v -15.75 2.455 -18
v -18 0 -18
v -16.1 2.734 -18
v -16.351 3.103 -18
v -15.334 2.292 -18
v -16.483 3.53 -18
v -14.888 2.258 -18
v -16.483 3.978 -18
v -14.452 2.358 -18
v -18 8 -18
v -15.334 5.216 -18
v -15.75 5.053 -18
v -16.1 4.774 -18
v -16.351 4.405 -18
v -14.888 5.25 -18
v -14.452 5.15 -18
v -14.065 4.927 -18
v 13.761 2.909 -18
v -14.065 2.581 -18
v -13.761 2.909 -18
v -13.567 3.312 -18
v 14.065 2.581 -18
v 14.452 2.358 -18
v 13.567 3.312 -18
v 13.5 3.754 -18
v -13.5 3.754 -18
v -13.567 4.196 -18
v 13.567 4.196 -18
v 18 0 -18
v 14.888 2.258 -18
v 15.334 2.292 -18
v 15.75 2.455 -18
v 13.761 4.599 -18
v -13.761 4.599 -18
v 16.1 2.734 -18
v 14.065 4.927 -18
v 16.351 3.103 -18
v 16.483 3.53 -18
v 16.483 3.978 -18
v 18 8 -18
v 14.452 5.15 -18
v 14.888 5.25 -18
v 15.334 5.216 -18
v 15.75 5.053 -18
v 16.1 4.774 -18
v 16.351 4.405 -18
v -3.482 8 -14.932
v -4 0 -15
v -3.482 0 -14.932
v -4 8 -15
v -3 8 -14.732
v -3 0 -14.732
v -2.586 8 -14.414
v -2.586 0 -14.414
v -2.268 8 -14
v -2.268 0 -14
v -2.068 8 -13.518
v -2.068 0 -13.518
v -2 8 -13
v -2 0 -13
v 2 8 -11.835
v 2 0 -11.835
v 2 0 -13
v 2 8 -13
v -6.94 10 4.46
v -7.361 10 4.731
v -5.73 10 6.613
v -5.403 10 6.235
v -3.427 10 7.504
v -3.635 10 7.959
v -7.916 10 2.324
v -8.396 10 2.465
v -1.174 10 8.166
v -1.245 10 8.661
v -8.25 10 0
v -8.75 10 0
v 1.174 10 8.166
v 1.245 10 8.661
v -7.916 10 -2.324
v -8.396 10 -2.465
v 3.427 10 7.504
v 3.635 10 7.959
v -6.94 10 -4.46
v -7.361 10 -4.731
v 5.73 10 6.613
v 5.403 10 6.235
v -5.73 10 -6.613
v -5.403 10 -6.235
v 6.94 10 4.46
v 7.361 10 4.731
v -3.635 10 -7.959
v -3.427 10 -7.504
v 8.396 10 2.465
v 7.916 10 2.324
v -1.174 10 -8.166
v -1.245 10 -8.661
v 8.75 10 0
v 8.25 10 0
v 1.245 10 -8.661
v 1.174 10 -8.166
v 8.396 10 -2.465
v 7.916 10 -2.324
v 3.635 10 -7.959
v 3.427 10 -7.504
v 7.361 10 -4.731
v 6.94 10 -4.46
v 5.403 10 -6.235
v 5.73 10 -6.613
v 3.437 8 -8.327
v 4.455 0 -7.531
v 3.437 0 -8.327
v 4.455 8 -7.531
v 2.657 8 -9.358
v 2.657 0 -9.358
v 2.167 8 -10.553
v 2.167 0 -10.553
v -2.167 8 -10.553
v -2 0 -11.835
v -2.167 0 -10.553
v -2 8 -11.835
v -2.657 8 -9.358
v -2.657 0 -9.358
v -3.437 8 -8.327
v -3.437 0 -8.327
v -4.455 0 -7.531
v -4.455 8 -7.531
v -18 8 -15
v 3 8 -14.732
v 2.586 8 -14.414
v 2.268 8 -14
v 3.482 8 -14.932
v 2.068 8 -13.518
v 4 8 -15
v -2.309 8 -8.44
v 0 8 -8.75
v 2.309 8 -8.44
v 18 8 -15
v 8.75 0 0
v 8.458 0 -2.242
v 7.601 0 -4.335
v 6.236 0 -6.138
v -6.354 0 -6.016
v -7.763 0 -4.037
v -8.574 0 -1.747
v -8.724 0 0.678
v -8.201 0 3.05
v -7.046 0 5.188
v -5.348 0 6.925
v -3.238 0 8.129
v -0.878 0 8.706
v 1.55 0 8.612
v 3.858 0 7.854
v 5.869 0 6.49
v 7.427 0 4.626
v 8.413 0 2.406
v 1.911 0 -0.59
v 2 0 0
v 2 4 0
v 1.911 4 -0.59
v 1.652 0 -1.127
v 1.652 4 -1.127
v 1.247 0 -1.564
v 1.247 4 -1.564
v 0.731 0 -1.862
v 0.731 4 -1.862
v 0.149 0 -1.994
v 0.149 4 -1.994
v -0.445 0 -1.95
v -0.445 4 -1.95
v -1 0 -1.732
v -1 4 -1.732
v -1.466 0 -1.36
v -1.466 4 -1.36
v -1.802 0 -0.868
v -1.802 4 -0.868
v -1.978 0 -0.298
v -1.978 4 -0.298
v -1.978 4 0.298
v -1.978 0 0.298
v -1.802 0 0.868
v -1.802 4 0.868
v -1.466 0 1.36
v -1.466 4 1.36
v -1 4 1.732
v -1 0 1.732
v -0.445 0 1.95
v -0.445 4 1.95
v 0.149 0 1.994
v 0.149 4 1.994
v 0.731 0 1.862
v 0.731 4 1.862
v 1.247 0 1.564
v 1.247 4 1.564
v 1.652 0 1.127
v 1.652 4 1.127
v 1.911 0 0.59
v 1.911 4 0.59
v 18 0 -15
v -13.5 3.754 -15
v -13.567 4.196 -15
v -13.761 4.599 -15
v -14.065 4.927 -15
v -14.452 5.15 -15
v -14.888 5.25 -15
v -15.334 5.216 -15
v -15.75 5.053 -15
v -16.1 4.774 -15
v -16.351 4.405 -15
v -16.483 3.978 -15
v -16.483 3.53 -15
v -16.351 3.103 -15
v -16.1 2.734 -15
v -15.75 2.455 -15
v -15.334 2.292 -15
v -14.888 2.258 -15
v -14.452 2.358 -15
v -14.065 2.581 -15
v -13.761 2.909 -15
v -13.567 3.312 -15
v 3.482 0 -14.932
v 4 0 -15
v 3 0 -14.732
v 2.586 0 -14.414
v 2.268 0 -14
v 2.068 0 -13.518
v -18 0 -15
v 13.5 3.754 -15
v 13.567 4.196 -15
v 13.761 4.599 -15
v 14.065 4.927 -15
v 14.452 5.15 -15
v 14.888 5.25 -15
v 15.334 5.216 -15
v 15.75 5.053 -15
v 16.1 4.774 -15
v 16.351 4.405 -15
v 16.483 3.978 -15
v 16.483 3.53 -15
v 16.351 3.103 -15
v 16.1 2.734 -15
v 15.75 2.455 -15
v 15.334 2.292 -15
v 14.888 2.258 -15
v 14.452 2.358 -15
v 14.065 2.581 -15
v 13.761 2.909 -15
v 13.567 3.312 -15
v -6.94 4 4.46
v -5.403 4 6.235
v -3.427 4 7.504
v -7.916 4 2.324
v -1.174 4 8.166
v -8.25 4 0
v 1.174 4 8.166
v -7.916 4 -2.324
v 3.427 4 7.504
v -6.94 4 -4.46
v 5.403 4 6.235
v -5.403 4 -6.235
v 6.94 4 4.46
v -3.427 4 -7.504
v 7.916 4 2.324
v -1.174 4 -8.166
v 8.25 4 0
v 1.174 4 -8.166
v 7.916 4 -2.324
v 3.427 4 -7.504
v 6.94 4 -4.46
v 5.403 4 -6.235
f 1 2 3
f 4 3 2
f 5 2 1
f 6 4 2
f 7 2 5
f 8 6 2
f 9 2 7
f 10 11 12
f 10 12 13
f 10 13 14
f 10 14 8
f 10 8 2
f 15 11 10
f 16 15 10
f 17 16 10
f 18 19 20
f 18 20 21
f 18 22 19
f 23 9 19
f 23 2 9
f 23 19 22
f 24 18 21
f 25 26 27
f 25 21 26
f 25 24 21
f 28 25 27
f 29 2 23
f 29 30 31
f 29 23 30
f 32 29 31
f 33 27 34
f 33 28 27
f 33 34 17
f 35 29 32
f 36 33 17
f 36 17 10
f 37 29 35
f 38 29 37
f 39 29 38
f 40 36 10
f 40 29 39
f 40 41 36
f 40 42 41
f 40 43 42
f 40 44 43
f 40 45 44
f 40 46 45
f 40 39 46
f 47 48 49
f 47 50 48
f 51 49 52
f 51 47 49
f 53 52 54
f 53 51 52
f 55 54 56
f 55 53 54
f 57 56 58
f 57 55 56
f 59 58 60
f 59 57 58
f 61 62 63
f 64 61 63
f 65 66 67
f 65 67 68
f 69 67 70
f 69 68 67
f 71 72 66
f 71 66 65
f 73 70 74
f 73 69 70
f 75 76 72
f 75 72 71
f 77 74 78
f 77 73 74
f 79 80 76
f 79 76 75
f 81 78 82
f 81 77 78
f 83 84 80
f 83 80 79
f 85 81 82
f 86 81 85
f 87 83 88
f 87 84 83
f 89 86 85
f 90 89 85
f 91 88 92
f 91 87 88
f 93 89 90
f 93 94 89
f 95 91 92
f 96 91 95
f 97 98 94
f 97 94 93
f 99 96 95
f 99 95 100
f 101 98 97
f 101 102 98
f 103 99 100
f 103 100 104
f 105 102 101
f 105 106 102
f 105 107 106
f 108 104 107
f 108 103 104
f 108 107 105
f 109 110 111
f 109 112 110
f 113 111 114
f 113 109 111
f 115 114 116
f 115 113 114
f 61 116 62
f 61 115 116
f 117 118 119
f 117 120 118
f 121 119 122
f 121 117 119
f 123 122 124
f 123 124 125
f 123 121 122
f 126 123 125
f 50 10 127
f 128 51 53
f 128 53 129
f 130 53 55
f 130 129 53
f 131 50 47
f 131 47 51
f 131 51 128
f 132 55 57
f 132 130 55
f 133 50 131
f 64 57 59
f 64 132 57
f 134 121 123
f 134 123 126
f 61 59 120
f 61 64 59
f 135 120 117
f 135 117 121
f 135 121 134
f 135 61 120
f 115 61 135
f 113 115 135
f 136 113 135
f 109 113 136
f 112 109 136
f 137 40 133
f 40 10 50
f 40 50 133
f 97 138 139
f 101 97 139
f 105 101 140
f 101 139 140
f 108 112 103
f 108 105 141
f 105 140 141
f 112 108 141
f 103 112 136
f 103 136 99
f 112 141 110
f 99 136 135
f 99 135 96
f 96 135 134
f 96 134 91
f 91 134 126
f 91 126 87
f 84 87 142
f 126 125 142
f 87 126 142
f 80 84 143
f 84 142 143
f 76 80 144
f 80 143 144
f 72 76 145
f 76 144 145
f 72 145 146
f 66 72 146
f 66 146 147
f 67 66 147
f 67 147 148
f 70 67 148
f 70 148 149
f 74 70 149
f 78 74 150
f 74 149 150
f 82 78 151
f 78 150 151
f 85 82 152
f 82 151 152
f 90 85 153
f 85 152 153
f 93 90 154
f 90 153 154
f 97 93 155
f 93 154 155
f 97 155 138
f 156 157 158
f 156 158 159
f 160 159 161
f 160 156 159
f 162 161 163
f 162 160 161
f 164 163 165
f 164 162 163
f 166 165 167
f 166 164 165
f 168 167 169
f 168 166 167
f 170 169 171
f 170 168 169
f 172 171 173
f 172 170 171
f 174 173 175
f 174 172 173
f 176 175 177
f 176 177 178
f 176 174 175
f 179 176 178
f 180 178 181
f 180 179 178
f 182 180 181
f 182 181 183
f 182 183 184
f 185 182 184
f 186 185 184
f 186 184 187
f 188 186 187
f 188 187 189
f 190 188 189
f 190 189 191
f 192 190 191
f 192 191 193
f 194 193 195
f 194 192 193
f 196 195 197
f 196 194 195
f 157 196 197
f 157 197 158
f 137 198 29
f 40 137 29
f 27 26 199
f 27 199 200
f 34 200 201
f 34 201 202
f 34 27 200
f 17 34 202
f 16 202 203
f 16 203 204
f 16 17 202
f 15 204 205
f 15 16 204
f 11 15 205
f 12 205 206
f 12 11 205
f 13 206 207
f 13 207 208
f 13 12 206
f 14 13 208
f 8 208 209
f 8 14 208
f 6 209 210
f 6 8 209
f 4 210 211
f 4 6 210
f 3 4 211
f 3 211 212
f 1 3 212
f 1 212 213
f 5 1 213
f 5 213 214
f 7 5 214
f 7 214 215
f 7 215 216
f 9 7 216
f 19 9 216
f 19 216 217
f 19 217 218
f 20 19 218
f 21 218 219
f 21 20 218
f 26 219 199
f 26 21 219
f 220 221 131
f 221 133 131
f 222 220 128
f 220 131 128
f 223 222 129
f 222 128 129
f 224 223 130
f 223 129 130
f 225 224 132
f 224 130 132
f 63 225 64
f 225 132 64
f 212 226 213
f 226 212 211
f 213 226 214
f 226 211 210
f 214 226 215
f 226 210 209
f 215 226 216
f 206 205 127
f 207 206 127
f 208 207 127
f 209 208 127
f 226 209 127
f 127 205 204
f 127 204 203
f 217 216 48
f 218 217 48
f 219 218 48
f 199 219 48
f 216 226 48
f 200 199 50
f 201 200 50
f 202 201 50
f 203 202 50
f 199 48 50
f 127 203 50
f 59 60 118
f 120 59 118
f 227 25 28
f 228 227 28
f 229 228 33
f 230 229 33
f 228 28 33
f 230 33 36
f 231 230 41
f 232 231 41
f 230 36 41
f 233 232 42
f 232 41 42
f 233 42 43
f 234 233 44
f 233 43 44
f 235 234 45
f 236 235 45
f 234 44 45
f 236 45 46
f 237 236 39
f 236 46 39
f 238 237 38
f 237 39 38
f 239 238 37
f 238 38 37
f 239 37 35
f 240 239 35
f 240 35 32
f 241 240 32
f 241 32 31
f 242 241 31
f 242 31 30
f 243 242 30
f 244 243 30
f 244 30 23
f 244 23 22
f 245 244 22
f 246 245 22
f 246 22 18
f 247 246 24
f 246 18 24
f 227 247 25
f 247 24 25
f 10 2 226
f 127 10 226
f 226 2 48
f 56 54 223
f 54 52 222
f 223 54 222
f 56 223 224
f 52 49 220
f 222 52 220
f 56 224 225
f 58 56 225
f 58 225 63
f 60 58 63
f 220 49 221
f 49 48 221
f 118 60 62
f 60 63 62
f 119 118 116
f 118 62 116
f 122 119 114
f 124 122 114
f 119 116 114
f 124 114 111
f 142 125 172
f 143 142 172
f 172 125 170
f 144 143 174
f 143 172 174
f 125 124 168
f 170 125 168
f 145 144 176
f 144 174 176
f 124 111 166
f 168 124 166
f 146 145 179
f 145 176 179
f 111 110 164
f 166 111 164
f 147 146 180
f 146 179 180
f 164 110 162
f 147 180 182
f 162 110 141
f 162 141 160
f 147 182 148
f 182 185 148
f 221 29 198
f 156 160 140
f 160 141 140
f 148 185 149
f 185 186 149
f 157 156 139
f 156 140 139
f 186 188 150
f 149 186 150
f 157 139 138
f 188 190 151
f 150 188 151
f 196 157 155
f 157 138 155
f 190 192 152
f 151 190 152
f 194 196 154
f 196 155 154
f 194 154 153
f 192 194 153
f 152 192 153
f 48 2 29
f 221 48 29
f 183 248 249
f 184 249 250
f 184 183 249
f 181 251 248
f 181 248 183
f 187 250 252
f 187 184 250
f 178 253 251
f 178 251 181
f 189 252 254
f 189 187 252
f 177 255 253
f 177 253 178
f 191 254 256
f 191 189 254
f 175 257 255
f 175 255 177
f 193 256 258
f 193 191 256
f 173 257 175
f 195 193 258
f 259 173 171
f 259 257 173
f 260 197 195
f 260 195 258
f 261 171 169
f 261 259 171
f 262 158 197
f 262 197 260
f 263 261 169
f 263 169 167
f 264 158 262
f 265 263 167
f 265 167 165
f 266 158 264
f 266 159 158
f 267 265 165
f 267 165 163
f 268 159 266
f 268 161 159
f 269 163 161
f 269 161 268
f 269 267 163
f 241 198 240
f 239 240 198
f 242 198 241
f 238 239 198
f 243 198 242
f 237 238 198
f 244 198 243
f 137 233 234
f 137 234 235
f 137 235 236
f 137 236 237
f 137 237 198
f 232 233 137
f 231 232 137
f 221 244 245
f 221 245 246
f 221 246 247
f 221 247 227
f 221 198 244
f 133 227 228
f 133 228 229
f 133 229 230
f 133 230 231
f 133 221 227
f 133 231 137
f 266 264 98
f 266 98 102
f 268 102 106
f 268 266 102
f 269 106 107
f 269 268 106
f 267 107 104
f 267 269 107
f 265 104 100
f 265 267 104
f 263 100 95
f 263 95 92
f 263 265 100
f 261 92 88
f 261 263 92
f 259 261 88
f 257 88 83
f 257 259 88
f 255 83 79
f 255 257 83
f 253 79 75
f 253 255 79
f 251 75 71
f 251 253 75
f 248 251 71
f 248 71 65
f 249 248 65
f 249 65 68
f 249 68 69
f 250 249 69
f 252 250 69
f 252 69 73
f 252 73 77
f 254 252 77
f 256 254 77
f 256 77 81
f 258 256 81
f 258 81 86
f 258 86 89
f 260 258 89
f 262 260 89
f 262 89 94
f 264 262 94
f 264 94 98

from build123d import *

# Parameters (mm, degrees)
SKETCH_1_R          = 8.75
SKETCH_1_R_2        = 8.25
EXTRUDE_2_DEPTH     = 10
SKETCH_2_R          = 8.25
SKETCH_2_R_2        = 2
EXTRUDE_3_DEPTH     = 4
EXTRUDE_4_DEPTH     = 8
SKETCH_5_W          = 3
SKETCH_5_H          = 8
EXTRUDE_5_DEPTH     = 3
SKETCH_6_W          = 3
SKETCH_6_H          = 8
EXTRUDE_6_DEPTH     = 3
SKETCH_7_R          = 1.5
CUT_EXTRUDE_1_DEPTH = 3
FILLET_1_R          = 5
FILLET_3_R          = 2
SKETCH_8_R          = 8.75
SKETCH_8_R_2        = 8.25
EXTRUDE_7_DEPTH     = 8
SKETCH_9_R          = 8.25
SKETCH_9_R_2        = 6
EXTRUDE_8_DEPTH     = 2
EXTRUDE_9_DEPTH     = 8
SKETCH_11_R         = 1.5
CUT_EXTRUDE_2_DEPTH = 8
CUT_EXTRUDE_3_DEPTH = 8
CUT_EXTRUDE_4_DEPTH = 8
SKETCH_14_R         = 8.75
SKETCH_14_R_2       = 8.25
EXTRUDE_10_DEPTH    = 8
EXTRUDE_11_DEPTH    = 8
SKETCH_16_R         = 1.5
CUT_EXTRUDE_5_DEPTH = 8
CUT_EXTRUDE_6_DEPTH = 10


with BuildPart() as part:
    # 草图1 → 凸台-拉伸2 (new body)
    with BuildSketch(Plane(origin=(0, 0, 0), x_dir=(1, 0, 0), z_dir=(0, 1, 0))):
        Circle(SKETCH_1_R)
        Circle(SKETCH_1_R_2, mode=Mode.SUBTRACT)
    extrude(amount=EXTRUDE_2_DEPTH)

    # 草图2 → 凸台-拉伸3 (add)
    with BuildSketch(Plane(origin=(0, 0, 0), x_dir=(1, 0, 0), z_dir=(0, 1, 0))):
        Circle(SKETCH_2_R)
        Circle(SKETCH_2_R_2, mode=Mode.SUBTRACT)
    extrude(amount=EXTRUDE_3_DEPTH)

    # 草图3 → 凸台-拉伸4 (add)
    with BuildSketch(Plane(origin=(0, 0, 0), x_dir=(1, 0, 0), z_dir=(0, 1, 0))):
        Polygon((-2, 8.518362519), (2, 8.518362519), (2, 15), (15, 15), (15, 18), (2, 18), (-2, 18), (-15, 18), (-15, 15), (-2, 15), align=None)
    extrude(amount=EXTRUDE_4_DEPTH)

    # 草图5 → 凸台-拉伸5 (add)
    with BuildSketch(Plane(origin=(15, 0, 0), x_dir=(0, 0, -1), z_dir=(1, 0, 0))):
        with Locations((16.5, 4)):
            Rectangle(SKETCH_5_W, SKETCH_5_H)
    extrude(amount=EXTRUDE_5_DEPTH)

    # 草图6 → 凸台-拉伸6 (add)
    with BuildSketch(Plane.ZY.offset(15)):
        with Locations((-16.5, 4)):
            Rectangle(SKETCH_6_W, SKETCH_6_H)
    extrude(amount=EXTRUDE_6_DEPTH)

    # 草图7 → 切除-拉伸1 (cut)
    with BuildSketch(Plane(origin=(0, 0, -18), x_dir=(-1, 0, 0), z_dir=(0, 0, -1))):
        with Locations((-15, 3.754021035)):
            Circle(SKETCH_7_R)
    cut_extrude_1 = extrude(amount=-CUT_EXTRUDE_1_DEPTH, mode=Mode.SUBTRACT)

    # 镜向1: 切除-拉伸1 across plane
    add(cut_extrude_1.mirror(Plane(origin=(0, 0, 0), x_dir=(0, 0, 1), z_dir=(1, 0, 0))), mode=Mode.SUBTRACT)

    # 圆角1
    fillet_1_edges = [part.edges().sort_by_distance(p)[0] for p in [
        (-2, 4, -8.518362519),
        (2, 4, -8.518362519),
    ]]
    fillet(fillet_1_edges, radius=FILLET_1_R)

    # 圆角3
    fillet_3_edges = [part.edges().sort_by_distance(p)[0] for p in [
        (-2, 4, -15),
        (2, 4, -15),
    ]]
    fillet(fillet_3_edges, radius=FILLET_3_R)


with BuildPart() as body_2:
    # 草图8 → 凸台-拉伸7 (new body)
    with BuildSketch(Plane(origin=(0, 0, 0), x_dir=(1, 0, 0), z_dir=(0, 1, 0))):
        with Locations((27.184954533, 0)):
            Circle(SKETCH_8_R)
        with Locations((27.184954533, 0)):
            Circle(SKETCH_8_R_2, mode=Mode.SUBTRACT)
    extrude(amount=EXTRUDE_7_DEPTH)

    # 草图9 → 凸台-拉伸8 (add)
    with BuildSketch(Plane.XZ):
        with Locations((27.184954533, 0)):
            Circle(SKETCH_9_R)
        with Locations((27.184954533, 0)):
            Circle(SKETCH_9_R_2, mode=Mode.SUBTRACT)
    extrude(amount=-EXTRUDE_8_DEPTH)

    # 草图10 → 凸台-拉伸9 (add)
    with BuildSketch(Plane(origin=(0, 0, 0), x_dir=(1, 0, 0), z_dir=(0, 1, 0))):
        Polygon((27.184954533, -18), (45.184954533, -18), (45.184954533, -14.663867829), (29.184954533, -14.663867829), (29.184954533, -8.518362519), (25.184954533, -8.518362519), (25.184954533, -14.663867829), (9.184954533, -14.663867829), (9.184954533, -18), align=None)
    extrude(amount=EXTRUDE_9_DEPTH)

    # 草图11 → 切除-拉伸2 (cut)
    with BuildSketch(Plane.XY.offset(18)):
        with Locations((12.184954533, 4)):
            Circle(SKETCH_11_R)
        with Locations((42.184954533, 4)):
            Circle(SKETCH_11_R)
    extrude(amount=-CUT_EXTRUDE_2_DEPTH, mode=Mode.SUBTRACT)

    # 草图12 → 切除-拉伸3 (cut)
    with BuildSketch(Plane.XY.offset(18)):
        with BuildLine():
            Line((10.684954533, 4), (10.684954533, 5))
            ThreePointArc((10.684954533, 5), (12.184954533, 6.5), (13.684954533, 5))
            Line((13.684954533, 5), (13.684954533, 4))
            Line((13.684954533, 4), (13.684954533, 3))
            ThreePointArc((13.684954533, 3), (12.184954533, 1.5), (10.684954533, 3))
            Line((10.684954533, 3), (10.684954533, 4))
        make_face()
    extrude(amount=-CUT_EXTRUDE_3_DEPTH, mode=Mode.SUBTRACT)

    # 草图13 → 切除-拉伸4 (cut)
    with BuildSketch(Plane.XY.offset(18)):
        with BuildLine():
            Line((40.684954533, 4), (40.684954533, 5))
            ThreePointArc((40.684954533, 5), (42.184954533, 6.5), (43.684954533, 5))
            Line((43.684954533, 5), (43.684954533, 4))
            Line((43.684954533, 4), (43.684954533, 3))
            ThreePointArc((43.684954533, 3), (42.184954533, 1.5), (40.684954533, 3))
            Line((40.684954533, 3), (40.684954533, 4))
        make_face()
    extrude(amount=-CUT_EXTRUDE_4_DEPTH, mode=Mode.SUBTRACT)


with BuildPart() as body_3:
    # 草图14 → 凸台-拉伸10 (new body)
    with BuildSketch(Plane(origin=(0, 0, 0), x_dir=(1, 0, 0), z_dir=(0, 1, 0))):
        with Locations((-35.091635024, 0)):
            Circle(SKETCH_14_R)
        with Locations((-35.091635024, 0)):
            Circle(SKETCH_14_R_2, mode=Mode.SUBTRACT)
    extrude(amount=EXTRUDE_10_DEPTH)

    # 草图15 → 凸台-拉伸11 (add)
    with BuildSketch(Plane(origin=(0, 0, 0), x_dir=(1, 0, 0), z_dir=(0, 1, 0))):
        Polygon((-37.091635024, -15), (-37.091635024, -8.518362519), (-33.091635024, -8.518362519), (-33.091635024, -15), (-17.091635024, -15), (-17.091635024, -18), (-53.091635024, -18), (-53.091635024, -15), align=None)
    extrude(amount=EXTRUDE_11_DEPTH)

    # 草图16 → 切除-拉伸5 (cut)
    with BuildSketch(Plane.XY.offset(18)):
        with Locations((-50.091635024, 4)):
            Circle(SKETCH_16_R)
        with Locations((-20.091635024, 4)):
            Circle(SKETCH_16_R)
    extrude(amount=-CUT_EXTRUDE_5_DEPTH, mode=Mode.SUBTRACT)


with BuildPart() as cut_extrude_6_tool:
    # 草图17 → 切除-拉伸6 (new body)
    with BuildSketch(Plane(origin=(0, 0, 0), x_dir=(1, 0, 0), z_dir=(0, 1, 0))):
        Polygon((-33.937696103, 15.405684546), (-2.722219819, -15.809791737), (14.647012306, -5.078130135), (14.647012306, 8.915639327), (41.967984005, 12.760711076), (60.531615551, -22.761160297), (-4.034255232, -33.891518563), (-68.183747723, -30.767123944), (-78.804576394, -10.443960936), (-56.287548242, 12.073067216), align=None)
    extrude(amount=CUT_EXTRUDE_6_DEPTH)


with BuildPart() as body_2_1:
    add(body_2.part)

    # 切除-拉伸6: cut by cut_extrude_6_tool
    add(cut_extrude_6_tool.part, mode=Mode.SUBTRACT)


with BuildPart() as body_3_1:
    add(body_3.part)

    # 切除-拉伸6: cut by cut_extrude_6_tool
    add(cut_extrude_6_tool.part, mode=Mode.SUBTRACT)


solid = part.part
